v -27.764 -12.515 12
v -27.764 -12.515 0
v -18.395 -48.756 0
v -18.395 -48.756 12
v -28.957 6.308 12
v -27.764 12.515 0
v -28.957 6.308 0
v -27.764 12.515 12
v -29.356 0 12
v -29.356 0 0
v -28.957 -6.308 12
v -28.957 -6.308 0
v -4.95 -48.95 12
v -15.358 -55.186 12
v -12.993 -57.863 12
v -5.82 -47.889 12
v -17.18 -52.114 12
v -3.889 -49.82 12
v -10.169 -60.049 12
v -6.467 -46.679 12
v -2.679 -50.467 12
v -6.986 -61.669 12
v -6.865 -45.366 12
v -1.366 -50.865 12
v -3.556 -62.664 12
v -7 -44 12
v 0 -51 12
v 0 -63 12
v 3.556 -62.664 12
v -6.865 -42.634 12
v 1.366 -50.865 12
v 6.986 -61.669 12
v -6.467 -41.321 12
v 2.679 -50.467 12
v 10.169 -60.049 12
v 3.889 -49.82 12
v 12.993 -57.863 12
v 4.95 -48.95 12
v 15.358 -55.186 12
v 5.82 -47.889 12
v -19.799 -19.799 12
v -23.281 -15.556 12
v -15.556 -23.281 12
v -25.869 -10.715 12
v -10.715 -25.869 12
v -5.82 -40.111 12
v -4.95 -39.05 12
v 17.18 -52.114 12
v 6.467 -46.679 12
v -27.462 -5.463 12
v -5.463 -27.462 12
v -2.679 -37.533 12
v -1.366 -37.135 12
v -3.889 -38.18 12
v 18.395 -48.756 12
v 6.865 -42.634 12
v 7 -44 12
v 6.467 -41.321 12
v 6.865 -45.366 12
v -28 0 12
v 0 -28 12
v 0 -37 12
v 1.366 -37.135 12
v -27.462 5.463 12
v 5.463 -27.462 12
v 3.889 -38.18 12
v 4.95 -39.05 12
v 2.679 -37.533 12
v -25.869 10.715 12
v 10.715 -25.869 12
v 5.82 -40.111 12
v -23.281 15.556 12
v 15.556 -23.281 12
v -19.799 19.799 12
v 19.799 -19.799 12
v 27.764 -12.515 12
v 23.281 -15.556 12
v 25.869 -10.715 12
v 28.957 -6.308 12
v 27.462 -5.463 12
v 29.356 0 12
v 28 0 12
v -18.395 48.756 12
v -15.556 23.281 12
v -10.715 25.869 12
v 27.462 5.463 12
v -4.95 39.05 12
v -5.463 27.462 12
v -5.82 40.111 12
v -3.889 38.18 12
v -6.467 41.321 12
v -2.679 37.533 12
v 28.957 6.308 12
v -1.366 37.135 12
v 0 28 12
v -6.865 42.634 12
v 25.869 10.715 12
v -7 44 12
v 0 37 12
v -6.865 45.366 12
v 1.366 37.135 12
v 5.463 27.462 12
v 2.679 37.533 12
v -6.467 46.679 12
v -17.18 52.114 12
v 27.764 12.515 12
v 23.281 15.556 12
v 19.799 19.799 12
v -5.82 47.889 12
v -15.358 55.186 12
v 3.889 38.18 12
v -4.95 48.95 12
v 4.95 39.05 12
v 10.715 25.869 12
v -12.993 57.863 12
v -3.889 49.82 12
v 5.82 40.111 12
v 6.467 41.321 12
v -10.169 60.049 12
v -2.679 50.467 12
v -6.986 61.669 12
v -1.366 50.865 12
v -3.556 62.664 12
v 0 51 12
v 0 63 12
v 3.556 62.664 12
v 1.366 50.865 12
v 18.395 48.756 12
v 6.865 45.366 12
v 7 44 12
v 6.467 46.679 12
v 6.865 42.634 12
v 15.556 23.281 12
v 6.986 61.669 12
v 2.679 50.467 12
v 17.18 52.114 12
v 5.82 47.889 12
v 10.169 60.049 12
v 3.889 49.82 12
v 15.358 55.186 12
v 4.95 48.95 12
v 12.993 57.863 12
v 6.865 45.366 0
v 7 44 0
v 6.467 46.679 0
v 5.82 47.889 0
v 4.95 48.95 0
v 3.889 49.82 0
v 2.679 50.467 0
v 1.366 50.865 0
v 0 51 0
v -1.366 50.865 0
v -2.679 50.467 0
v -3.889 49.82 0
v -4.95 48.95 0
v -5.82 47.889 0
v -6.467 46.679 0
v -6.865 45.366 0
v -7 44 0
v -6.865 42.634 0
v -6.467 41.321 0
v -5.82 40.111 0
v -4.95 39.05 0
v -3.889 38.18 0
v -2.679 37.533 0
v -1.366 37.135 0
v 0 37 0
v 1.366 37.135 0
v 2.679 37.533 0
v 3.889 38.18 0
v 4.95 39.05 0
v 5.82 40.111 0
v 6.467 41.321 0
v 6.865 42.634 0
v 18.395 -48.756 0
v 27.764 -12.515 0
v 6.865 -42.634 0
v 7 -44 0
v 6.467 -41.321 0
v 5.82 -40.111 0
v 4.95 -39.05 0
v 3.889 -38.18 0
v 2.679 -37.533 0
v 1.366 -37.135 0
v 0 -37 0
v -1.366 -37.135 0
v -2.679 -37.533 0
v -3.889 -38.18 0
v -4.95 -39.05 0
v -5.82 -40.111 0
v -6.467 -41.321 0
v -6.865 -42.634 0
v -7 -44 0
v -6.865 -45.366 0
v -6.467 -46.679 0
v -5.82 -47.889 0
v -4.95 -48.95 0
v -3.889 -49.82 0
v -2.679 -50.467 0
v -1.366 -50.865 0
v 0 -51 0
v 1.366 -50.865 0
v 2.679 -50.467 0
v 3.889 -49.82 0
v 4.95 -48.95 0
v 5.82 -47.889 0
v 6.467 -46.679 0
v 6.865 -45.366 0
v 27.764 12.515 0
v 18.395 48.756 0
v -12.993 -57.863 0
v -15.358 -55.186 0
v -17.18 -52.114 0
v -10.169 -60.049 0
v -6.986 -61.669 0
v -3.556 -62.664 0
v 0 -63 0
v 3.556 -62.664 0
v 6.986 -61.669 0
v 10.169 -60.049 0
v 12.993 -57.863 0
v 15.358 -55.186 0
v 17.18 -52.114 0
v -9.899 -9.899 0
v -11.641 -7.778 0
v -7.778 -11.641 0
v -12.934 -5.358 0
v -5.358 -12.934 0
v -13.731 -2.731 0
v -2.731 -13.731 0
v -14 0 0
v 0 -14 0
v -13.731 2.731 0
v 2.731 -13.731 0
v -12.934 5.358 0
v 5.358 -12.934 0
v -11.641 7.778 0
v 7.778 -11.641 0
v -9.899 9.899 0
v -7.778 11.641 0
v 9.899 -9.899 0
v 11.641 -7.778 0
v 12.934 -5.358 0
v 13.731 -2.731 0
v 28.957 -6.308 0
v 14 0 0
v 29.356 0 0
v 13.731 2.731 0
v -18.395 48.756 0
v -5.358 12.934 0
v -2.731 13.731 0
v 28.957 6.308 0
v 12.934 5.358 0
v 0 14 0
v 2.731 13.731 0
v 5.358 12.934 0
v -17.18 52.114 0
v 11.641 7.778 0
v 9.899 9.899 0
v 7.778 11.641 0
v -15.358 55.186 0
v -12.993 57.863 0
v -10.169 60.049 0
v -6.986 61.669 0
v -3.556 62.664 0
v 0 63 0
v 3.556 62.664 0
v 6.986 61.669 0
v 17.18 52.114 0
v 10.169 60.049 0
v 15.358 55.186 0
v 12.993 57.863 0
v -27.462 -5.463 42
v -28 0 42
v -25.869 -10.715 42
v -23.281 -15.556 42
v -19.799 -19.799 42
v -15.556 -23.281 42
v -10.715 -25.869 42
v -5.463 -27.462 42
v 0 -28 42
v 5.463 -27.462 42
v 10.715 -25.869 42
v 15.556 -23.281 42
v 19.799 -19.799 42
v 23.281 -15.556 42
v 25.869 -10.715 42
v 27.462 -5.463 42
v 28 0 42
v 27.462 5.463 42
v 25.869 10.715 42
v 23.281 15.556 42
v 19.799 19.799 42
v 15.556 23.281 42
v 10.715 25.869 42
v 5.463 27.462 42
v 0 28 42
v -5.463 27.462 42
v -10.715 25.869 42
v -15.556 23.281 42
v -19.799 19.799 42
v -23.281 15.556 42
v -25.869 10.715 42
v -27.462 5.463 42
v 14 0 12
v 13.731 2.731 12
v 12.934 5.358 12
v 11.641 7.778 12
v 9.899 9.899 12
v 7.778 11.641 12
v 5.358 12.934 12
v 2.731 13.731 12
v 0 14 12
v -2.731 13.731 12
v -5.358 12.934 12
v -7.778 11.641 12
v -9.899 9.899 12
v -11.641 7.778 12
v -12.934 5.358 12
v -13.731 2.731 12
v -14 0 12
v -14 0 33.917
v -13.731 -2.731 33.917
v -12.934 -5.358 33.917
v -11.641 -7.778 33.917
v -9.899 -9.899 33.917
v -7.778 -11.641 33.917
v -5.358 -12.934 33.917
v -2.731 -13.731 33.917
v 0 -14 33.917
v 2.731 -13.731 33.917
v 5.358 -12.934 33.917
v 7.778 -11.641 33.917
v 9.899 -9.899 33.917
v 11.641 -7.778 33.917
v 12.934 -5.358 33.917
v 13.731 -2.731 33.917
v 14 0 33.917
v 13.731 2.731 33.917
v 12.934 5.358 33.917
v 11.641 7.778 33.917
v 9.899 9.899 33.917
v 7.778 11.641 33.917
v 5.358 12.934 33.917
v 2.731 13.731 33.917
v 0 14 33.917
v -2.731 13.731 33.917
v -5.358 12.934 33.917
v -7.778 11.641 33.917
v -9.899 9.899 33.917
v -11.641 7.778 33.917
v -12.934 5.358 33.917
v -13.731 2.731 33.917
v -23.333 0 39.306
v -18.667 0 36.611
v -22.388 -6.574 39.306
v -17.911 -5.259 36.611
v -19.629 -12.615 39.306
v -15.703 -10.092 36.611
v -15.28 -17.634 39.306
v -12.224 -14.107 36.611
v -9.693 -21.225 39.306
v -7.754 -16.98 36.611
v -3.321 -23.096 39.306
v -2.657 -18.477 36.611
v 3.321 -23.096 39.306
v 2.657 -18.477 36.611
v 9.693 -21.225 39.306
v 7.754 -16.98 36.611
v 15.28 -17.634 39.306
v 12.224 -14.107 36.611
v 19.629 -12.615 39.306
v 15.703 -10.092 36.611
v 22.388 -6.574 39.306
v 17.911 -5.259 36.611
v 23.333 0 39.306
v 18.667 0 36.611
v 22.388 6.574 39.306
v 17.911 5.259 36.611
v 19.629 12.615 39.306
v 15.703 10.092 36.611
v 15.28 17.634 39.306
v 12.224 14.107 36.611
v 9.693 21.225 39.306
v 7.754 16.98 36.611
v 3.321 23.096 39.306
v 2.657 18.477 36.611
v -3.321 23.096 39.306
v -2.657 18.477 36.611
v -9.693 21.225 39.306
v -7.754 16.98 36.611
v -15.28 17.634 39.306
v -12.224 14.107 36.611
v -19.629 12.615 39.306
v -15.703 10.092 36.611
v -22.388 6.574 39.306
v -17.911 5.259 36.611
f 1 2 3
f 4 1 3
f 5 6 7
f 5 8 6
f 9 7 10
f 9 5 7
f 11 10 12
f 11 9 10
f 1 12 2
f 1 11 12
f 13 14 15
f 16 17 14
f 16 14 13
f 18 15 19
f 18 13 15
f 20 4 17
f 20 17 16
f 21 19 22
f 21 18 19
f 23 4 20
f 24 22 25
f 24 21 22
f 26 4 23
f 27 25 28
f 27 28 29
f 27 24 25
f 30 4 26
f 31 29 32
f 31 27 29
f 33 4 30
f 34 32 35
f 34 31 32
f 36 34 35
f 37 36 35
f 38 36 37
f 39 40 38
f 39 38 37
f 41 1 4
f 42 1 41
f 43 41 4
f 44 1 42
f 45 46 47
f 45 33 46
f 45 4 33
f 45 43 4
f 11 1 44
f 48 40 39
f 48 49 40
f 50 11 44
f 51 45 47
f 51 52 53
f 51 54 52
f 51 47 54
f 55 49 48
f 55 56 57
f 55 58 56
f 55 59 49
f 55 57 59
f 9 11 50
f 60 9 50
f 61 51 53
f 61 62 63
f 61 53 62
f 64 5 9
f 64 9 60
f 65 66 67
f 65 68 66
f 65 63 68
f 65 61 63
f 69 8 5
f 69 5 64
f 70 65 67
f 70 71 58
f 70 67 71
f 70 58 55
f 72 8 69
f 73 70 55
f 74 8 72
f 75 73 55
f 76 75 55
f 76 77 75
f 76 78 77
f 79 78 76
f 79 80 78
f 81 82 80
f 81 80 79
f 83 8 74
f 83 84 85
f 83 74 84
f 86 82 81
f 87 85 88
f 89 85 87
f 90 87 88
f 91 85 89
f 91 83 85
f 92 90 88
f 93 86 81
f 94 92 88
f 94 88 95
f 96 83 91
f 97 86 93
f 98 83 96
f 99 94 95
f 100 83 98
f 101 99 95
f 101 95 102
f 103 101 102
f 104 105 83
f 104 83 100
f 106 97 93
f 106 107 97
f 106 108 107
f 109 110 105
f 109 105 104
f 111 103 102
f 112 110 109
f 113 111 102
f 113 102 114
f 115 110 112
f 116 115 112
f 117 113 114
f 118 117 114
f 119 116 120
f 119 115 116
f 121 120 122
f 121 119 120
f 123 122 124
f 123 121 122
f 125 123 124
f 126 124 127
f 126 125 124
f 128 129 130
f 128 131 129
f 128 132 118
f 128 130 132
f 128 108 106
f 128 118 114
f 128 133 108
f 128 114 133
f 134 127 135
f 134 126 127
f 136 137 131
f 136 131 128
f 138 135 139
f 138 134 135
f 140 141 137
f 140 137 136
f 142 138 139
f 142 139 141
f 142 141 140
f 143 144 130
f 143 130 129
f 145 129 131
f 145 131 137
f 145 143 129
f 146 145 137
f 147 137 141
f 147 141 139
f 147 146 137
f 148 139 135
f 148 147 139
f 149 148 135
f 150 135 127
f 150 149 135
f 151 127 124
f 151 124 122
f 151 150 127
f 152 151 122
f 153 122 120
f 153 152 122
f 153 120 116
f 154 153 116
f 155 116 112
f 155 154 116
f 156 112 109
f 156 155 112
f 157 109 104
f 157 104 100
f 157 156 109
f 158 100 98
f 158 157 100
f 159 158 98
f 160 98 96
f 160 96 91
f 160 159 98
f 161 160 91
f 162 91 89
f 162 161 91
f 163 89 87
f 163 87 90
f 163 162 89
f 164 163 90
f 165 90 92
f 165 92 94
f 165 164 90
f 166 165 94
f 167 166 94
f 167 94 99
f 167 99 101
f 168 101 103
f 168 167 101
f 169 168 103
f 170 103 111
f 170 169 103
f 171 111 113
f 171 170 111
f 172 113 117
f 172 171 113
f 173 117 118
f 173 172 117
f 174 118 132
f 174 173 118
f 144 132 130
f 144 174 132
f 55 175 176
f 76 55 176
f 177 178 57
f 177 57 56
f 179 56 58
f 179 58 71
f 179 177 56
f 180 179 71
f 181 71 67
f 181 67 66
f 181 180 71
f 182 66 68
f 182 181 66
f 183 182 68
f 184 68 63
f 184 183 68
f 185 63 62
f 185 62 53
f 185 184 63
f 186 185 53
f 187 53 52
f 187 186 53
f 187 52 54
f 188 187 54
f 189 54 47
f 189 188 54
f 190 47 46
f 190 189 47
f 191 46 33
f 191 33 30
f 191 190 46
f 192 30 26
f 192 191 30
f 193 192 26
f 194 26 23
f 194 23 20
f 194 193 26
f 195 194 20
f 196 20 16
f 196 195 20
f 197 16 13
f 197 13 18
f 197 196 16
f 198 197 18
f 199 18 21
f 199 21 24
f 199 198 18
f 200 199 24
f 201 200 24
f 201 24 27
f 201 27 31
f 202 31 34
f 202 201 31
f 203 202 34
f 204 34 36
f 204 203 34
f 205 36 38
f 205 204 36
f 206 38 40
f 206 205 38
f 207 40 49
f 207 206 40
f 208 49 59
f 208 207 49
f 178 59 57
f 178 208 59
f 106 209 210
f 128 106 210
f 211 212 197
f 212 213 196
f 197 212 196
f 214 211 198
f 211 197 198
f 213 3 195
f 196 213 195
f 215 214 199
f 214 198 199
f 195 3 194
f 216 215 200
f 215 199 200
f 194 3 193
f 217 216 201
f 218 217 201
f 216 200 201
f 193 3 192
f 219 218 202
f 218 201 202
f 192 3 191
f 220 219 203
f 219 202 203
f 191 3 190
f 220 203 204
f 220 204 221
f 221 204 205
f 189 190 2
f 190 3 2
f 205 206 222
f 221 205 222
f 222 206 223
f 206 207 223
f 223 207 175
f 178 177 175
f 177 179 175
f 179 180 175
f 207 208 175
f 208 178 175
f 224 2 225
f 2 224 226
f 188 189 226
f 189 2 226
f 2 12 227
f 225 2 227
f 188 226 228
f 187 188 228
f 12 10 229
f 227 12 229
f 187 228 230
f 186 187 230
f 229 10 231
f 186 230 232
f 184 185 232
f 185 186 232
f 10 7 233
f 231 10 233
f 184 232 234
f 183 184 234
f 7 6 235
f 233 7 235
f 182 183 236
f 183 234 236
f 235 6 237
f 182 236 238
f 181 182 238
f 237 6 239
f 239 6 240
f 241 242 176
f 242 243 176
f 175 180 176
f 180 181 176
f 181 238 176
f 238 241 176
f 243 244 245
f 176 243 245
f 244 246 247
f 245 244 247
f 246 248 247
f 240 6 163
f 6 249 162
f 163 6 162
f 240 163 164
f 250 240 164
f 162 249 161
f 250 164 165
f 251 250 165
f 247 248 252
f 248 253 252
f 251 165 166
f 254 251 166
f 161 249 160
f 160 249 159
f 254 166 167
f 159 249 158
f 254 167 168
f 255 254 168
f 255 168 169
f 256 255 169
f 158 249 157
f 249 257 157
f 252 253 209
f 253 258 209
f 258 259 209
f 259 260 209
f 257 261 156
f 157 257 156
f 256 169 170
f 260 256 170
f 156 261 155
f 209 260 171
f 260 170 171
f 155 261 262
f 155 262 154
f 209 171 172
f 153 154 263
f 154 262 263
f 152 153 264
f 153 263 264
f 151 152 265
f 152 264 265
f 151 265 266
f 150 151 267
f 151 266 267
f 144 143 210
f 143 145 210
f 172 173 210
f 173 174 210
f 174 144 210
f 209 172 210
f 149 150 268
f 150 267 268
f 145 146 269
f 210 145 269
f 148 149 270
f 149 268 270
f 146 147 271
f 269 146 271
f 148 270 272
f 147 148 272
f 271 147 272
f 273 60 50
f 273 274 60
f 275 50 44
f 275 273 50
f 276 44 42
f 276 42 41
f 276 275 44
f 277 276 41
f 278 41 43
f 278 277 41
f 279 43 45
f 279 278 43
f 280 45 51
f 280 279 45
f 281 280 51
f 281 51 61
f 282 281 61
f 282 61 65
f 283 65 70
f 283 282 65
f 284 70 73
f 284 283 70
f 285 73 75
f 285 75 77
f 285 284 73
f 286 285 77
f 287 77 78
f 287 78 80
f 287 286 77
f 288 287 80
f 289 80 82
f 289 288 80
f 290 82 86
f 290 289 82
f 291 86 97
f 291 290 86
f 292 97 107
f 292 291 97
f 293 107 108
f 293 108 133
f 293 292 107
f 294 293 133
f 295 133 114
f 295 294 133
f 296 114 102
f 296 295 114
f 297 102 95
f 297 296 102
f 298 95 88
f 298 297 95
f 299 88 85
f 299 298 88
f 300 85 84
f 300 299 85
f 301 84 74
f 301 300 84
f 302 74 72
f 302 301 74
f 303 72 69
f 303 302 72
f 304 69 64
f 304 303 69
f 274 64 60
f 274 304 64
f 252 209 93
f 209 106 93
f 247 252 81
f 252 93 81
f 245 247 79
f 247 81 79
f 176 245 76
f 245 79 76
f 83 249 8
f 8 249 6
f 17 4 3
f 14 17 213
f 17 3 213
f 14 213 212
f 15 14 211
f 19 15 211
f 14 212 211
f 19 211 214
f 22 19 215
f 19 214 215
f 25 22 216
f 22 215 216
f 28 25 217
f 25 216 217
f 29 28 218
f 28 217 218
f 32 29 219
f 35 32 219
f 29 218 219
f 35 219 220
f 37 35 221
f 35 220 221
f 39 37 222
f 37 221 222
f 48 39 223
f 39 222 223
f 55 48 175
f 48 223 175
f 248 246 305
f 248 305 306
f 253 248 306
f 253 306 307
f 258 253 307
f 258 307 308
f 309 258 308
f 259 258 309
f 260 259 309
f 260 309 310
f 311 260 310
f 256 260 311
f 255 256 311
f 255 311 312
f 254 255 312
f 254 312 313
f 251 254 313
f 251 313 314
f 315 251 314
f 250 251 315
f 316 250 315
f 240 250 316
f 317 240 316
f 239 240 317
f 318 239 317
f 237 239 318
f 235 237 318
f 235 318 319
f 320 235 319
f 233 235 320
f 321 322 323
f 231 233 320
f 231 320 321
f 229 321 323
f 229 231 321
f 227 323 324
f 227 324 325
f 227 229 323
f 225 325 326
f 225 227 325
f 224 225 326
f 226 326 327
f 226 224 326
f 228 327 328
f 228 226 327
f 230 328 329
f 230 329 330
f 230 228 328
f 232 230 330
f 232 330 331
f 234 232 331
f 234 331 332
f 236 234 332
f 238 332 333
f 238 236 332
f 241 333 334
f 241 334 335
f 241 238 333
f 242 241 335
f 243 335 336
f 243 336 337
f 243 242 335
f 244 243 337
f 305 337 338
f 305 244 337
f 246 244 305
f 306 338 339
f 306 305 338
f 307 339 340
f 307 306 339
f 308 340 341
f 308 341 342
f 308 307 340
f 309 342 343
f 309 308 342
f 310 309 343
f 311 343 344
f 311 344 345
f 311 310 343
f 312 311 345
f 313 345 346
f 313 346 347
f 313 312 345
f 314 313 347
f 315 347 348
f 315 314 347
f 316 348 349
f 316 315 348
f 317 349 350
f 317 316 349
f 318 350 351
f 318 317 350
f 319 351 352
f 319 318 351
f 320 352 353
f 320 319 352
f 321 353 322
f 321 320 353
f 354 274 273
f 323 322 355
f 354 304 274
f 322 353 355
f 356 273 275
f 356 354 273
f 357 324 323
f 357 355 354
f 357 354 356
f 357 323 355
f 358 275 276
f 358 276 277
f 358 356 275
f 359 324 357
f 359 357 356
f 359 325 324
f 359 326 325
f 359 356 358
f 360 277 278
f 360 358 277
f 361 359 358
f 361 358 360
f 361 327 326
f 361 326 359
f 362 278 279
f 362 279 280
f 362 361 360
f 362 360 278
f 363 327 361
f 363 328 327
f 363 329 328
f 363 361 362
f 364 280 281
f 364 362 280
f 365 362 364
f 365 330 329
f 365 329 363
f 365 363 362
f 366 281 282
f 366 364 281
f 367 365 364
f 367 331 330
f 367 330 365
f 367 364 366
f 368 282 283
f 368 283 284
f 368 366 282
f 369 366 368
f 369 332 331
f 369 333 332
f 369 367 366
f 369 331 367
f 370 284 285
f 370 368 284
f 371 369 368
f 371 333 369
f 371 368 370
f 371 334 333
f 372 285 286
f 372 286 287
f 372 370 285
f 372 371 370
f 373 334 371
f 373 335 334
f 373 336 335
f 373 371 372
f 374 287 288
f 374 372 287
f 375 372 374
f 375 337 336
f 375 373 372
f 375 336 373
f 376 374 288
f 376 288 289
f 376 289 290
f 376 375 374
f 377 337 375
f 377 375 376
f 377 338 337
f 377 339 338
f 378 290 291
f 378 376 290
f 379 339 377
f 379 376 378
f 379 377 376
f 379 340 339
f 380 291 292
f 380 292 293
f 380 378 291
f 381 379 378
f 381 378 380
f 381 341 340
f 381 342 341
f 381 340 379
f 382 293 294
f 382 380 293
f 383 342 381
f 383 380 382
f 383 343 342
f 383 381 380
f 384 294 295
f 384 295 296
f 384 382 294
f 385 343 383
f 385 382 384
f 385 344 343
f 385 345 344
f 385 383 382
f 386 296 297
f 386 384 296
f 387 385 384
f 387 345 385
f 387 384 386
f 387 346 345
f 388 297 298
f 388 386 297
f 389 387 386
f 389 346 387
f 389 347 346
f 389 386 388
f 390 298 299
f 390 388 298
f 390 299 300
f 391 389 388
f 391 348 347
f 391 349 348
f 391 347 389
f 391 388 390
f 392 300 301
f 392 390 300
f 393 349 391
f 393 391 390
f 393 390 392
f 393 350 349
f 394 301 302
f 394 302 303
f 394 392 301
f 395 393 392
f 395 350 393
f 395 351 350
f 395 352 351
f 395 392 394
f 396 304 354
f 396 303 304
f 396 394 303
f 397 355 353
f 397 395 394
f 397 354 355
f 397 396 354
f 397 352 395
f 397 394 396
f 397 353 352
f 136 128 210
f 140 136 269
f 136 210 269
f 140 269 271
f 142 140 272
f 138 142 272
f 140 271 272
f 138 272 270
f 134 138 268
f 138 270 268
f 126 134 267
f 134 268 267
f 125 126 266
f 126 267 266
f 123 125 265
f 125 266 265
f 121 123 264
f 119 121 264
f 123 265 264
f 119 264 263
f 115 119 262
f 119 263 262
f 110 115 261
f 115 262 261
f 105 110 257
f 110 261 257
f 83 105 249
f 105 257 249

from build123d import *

# Parameters (mm, degrees)
SKETCH1_R           = 7
SKETCH1_R_2         = 14
BOSS_EXTRUDE1_DEPTH = 12
FILLET1_R           = 50


with BuildPart() as part:
    # Sketch1 → Boss-Extrude1 (new body)
    with BuildSketch(Plane.XY):
        with BuildLine():
            Line((-18.395196505, 48.755706629), (-31, 0))
            Line((-31, 0), (-18.395196505, -48.755706629))
            ThreePointArc((-18.395196505, -48.755706629), (0, -63), (18.395196505, -48.755706629))
            Line((18.395196505, -48.755706629), (31, 0))
            Line((31, 0), (18.395196505, 48.755706629))
            ThreePointArc((18.395196505, 48.755706629), (0, 63), (-18.395196505, 48.755706629))
        make_face()
        with Locations((0, 44)):
            Circle(SKETCH1_R, mode=Mode.SUBTRACT)
        with Locations((0, -44)):
            Circle(SKETCH1_R, mode=Mode.SUBTRACT)
        Circle(SKETCH1_R_2, mode=Mode.SUBTRACT)
    extrude(amount=BOSS_EXTRUDE1_DEPTH)

    # Fillet1
    fillet1_edges = [part.edges().sort_by_distance(p)[0] for p in [
        (31, 0, 6),
        (-31, 0, 6),
    ]]
    fillet(fillet1_edges, radius=FILLET1_R)

    # Sketch3 → Revolve1 (revolve)
    with BuildSketch(Plane(origin=(0, 0, 0), x_dir=(1, 0, 0), z_dir=(0, 1, 0)), mode=Mode.PRIVATE) as revolve1_sk:
        Polygon((14, -12), (28, -12), (28, -42), (14, -33.917096231), align=None)
    revolve(revolve1_sk.sketch.rotate(Axis((0, 0, -17.419804193), (0, 0, 1)), 180), axis=Axis((0, 0, -17.419804193), (0, 0, 1)))


solid = part.part
